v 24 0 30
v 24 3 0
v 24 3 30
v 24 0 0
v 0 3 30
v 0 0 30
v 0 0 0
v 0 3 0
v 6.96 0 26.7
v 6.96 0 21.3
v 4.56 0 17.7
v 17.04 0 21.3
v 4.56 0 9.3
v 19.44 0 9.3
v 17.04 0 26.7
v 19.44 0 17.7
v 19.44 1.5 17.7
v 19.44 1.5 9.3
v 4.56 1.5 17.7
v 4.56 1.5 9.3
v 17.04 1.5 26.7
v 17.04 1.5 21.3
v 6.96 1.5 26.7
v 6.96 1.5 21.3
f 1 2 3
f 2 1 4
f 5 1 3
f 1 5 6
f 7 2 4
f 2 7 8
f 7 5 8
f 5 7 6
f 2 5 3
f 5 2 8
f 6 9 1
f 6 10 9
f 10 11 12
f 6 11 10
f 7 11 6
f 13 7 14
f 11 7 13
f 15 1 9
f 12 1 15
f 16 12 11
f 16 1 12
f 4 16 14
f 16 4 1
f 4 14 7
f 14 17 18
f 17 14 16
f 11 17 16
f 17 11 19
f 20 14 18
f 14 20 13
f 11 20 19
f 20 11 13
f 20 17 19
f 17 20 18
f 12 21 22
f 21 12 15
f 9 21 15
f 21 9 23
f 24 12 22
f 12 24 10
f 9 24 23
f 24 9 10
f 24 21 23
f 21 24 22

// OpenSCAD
// DIN-rail retaining clip.
$fn = 60;
eps = 0.02;
clip_w = 24;
clip_h = 30;
clip_t = 3;
difference() { cube([clip_w,clip_t,clip_h]); translate([clip_w/2, -eps, clip_h*0.45]) cube([clip_w*0.62,clip_t+2*eps,clip_h*0.28],center=true); translate([clip_w/2, -eps, clip_h*0.8]) cube([clip_w*0.42,clip_t+2*eps,clip_h*0.18],center=true); }
